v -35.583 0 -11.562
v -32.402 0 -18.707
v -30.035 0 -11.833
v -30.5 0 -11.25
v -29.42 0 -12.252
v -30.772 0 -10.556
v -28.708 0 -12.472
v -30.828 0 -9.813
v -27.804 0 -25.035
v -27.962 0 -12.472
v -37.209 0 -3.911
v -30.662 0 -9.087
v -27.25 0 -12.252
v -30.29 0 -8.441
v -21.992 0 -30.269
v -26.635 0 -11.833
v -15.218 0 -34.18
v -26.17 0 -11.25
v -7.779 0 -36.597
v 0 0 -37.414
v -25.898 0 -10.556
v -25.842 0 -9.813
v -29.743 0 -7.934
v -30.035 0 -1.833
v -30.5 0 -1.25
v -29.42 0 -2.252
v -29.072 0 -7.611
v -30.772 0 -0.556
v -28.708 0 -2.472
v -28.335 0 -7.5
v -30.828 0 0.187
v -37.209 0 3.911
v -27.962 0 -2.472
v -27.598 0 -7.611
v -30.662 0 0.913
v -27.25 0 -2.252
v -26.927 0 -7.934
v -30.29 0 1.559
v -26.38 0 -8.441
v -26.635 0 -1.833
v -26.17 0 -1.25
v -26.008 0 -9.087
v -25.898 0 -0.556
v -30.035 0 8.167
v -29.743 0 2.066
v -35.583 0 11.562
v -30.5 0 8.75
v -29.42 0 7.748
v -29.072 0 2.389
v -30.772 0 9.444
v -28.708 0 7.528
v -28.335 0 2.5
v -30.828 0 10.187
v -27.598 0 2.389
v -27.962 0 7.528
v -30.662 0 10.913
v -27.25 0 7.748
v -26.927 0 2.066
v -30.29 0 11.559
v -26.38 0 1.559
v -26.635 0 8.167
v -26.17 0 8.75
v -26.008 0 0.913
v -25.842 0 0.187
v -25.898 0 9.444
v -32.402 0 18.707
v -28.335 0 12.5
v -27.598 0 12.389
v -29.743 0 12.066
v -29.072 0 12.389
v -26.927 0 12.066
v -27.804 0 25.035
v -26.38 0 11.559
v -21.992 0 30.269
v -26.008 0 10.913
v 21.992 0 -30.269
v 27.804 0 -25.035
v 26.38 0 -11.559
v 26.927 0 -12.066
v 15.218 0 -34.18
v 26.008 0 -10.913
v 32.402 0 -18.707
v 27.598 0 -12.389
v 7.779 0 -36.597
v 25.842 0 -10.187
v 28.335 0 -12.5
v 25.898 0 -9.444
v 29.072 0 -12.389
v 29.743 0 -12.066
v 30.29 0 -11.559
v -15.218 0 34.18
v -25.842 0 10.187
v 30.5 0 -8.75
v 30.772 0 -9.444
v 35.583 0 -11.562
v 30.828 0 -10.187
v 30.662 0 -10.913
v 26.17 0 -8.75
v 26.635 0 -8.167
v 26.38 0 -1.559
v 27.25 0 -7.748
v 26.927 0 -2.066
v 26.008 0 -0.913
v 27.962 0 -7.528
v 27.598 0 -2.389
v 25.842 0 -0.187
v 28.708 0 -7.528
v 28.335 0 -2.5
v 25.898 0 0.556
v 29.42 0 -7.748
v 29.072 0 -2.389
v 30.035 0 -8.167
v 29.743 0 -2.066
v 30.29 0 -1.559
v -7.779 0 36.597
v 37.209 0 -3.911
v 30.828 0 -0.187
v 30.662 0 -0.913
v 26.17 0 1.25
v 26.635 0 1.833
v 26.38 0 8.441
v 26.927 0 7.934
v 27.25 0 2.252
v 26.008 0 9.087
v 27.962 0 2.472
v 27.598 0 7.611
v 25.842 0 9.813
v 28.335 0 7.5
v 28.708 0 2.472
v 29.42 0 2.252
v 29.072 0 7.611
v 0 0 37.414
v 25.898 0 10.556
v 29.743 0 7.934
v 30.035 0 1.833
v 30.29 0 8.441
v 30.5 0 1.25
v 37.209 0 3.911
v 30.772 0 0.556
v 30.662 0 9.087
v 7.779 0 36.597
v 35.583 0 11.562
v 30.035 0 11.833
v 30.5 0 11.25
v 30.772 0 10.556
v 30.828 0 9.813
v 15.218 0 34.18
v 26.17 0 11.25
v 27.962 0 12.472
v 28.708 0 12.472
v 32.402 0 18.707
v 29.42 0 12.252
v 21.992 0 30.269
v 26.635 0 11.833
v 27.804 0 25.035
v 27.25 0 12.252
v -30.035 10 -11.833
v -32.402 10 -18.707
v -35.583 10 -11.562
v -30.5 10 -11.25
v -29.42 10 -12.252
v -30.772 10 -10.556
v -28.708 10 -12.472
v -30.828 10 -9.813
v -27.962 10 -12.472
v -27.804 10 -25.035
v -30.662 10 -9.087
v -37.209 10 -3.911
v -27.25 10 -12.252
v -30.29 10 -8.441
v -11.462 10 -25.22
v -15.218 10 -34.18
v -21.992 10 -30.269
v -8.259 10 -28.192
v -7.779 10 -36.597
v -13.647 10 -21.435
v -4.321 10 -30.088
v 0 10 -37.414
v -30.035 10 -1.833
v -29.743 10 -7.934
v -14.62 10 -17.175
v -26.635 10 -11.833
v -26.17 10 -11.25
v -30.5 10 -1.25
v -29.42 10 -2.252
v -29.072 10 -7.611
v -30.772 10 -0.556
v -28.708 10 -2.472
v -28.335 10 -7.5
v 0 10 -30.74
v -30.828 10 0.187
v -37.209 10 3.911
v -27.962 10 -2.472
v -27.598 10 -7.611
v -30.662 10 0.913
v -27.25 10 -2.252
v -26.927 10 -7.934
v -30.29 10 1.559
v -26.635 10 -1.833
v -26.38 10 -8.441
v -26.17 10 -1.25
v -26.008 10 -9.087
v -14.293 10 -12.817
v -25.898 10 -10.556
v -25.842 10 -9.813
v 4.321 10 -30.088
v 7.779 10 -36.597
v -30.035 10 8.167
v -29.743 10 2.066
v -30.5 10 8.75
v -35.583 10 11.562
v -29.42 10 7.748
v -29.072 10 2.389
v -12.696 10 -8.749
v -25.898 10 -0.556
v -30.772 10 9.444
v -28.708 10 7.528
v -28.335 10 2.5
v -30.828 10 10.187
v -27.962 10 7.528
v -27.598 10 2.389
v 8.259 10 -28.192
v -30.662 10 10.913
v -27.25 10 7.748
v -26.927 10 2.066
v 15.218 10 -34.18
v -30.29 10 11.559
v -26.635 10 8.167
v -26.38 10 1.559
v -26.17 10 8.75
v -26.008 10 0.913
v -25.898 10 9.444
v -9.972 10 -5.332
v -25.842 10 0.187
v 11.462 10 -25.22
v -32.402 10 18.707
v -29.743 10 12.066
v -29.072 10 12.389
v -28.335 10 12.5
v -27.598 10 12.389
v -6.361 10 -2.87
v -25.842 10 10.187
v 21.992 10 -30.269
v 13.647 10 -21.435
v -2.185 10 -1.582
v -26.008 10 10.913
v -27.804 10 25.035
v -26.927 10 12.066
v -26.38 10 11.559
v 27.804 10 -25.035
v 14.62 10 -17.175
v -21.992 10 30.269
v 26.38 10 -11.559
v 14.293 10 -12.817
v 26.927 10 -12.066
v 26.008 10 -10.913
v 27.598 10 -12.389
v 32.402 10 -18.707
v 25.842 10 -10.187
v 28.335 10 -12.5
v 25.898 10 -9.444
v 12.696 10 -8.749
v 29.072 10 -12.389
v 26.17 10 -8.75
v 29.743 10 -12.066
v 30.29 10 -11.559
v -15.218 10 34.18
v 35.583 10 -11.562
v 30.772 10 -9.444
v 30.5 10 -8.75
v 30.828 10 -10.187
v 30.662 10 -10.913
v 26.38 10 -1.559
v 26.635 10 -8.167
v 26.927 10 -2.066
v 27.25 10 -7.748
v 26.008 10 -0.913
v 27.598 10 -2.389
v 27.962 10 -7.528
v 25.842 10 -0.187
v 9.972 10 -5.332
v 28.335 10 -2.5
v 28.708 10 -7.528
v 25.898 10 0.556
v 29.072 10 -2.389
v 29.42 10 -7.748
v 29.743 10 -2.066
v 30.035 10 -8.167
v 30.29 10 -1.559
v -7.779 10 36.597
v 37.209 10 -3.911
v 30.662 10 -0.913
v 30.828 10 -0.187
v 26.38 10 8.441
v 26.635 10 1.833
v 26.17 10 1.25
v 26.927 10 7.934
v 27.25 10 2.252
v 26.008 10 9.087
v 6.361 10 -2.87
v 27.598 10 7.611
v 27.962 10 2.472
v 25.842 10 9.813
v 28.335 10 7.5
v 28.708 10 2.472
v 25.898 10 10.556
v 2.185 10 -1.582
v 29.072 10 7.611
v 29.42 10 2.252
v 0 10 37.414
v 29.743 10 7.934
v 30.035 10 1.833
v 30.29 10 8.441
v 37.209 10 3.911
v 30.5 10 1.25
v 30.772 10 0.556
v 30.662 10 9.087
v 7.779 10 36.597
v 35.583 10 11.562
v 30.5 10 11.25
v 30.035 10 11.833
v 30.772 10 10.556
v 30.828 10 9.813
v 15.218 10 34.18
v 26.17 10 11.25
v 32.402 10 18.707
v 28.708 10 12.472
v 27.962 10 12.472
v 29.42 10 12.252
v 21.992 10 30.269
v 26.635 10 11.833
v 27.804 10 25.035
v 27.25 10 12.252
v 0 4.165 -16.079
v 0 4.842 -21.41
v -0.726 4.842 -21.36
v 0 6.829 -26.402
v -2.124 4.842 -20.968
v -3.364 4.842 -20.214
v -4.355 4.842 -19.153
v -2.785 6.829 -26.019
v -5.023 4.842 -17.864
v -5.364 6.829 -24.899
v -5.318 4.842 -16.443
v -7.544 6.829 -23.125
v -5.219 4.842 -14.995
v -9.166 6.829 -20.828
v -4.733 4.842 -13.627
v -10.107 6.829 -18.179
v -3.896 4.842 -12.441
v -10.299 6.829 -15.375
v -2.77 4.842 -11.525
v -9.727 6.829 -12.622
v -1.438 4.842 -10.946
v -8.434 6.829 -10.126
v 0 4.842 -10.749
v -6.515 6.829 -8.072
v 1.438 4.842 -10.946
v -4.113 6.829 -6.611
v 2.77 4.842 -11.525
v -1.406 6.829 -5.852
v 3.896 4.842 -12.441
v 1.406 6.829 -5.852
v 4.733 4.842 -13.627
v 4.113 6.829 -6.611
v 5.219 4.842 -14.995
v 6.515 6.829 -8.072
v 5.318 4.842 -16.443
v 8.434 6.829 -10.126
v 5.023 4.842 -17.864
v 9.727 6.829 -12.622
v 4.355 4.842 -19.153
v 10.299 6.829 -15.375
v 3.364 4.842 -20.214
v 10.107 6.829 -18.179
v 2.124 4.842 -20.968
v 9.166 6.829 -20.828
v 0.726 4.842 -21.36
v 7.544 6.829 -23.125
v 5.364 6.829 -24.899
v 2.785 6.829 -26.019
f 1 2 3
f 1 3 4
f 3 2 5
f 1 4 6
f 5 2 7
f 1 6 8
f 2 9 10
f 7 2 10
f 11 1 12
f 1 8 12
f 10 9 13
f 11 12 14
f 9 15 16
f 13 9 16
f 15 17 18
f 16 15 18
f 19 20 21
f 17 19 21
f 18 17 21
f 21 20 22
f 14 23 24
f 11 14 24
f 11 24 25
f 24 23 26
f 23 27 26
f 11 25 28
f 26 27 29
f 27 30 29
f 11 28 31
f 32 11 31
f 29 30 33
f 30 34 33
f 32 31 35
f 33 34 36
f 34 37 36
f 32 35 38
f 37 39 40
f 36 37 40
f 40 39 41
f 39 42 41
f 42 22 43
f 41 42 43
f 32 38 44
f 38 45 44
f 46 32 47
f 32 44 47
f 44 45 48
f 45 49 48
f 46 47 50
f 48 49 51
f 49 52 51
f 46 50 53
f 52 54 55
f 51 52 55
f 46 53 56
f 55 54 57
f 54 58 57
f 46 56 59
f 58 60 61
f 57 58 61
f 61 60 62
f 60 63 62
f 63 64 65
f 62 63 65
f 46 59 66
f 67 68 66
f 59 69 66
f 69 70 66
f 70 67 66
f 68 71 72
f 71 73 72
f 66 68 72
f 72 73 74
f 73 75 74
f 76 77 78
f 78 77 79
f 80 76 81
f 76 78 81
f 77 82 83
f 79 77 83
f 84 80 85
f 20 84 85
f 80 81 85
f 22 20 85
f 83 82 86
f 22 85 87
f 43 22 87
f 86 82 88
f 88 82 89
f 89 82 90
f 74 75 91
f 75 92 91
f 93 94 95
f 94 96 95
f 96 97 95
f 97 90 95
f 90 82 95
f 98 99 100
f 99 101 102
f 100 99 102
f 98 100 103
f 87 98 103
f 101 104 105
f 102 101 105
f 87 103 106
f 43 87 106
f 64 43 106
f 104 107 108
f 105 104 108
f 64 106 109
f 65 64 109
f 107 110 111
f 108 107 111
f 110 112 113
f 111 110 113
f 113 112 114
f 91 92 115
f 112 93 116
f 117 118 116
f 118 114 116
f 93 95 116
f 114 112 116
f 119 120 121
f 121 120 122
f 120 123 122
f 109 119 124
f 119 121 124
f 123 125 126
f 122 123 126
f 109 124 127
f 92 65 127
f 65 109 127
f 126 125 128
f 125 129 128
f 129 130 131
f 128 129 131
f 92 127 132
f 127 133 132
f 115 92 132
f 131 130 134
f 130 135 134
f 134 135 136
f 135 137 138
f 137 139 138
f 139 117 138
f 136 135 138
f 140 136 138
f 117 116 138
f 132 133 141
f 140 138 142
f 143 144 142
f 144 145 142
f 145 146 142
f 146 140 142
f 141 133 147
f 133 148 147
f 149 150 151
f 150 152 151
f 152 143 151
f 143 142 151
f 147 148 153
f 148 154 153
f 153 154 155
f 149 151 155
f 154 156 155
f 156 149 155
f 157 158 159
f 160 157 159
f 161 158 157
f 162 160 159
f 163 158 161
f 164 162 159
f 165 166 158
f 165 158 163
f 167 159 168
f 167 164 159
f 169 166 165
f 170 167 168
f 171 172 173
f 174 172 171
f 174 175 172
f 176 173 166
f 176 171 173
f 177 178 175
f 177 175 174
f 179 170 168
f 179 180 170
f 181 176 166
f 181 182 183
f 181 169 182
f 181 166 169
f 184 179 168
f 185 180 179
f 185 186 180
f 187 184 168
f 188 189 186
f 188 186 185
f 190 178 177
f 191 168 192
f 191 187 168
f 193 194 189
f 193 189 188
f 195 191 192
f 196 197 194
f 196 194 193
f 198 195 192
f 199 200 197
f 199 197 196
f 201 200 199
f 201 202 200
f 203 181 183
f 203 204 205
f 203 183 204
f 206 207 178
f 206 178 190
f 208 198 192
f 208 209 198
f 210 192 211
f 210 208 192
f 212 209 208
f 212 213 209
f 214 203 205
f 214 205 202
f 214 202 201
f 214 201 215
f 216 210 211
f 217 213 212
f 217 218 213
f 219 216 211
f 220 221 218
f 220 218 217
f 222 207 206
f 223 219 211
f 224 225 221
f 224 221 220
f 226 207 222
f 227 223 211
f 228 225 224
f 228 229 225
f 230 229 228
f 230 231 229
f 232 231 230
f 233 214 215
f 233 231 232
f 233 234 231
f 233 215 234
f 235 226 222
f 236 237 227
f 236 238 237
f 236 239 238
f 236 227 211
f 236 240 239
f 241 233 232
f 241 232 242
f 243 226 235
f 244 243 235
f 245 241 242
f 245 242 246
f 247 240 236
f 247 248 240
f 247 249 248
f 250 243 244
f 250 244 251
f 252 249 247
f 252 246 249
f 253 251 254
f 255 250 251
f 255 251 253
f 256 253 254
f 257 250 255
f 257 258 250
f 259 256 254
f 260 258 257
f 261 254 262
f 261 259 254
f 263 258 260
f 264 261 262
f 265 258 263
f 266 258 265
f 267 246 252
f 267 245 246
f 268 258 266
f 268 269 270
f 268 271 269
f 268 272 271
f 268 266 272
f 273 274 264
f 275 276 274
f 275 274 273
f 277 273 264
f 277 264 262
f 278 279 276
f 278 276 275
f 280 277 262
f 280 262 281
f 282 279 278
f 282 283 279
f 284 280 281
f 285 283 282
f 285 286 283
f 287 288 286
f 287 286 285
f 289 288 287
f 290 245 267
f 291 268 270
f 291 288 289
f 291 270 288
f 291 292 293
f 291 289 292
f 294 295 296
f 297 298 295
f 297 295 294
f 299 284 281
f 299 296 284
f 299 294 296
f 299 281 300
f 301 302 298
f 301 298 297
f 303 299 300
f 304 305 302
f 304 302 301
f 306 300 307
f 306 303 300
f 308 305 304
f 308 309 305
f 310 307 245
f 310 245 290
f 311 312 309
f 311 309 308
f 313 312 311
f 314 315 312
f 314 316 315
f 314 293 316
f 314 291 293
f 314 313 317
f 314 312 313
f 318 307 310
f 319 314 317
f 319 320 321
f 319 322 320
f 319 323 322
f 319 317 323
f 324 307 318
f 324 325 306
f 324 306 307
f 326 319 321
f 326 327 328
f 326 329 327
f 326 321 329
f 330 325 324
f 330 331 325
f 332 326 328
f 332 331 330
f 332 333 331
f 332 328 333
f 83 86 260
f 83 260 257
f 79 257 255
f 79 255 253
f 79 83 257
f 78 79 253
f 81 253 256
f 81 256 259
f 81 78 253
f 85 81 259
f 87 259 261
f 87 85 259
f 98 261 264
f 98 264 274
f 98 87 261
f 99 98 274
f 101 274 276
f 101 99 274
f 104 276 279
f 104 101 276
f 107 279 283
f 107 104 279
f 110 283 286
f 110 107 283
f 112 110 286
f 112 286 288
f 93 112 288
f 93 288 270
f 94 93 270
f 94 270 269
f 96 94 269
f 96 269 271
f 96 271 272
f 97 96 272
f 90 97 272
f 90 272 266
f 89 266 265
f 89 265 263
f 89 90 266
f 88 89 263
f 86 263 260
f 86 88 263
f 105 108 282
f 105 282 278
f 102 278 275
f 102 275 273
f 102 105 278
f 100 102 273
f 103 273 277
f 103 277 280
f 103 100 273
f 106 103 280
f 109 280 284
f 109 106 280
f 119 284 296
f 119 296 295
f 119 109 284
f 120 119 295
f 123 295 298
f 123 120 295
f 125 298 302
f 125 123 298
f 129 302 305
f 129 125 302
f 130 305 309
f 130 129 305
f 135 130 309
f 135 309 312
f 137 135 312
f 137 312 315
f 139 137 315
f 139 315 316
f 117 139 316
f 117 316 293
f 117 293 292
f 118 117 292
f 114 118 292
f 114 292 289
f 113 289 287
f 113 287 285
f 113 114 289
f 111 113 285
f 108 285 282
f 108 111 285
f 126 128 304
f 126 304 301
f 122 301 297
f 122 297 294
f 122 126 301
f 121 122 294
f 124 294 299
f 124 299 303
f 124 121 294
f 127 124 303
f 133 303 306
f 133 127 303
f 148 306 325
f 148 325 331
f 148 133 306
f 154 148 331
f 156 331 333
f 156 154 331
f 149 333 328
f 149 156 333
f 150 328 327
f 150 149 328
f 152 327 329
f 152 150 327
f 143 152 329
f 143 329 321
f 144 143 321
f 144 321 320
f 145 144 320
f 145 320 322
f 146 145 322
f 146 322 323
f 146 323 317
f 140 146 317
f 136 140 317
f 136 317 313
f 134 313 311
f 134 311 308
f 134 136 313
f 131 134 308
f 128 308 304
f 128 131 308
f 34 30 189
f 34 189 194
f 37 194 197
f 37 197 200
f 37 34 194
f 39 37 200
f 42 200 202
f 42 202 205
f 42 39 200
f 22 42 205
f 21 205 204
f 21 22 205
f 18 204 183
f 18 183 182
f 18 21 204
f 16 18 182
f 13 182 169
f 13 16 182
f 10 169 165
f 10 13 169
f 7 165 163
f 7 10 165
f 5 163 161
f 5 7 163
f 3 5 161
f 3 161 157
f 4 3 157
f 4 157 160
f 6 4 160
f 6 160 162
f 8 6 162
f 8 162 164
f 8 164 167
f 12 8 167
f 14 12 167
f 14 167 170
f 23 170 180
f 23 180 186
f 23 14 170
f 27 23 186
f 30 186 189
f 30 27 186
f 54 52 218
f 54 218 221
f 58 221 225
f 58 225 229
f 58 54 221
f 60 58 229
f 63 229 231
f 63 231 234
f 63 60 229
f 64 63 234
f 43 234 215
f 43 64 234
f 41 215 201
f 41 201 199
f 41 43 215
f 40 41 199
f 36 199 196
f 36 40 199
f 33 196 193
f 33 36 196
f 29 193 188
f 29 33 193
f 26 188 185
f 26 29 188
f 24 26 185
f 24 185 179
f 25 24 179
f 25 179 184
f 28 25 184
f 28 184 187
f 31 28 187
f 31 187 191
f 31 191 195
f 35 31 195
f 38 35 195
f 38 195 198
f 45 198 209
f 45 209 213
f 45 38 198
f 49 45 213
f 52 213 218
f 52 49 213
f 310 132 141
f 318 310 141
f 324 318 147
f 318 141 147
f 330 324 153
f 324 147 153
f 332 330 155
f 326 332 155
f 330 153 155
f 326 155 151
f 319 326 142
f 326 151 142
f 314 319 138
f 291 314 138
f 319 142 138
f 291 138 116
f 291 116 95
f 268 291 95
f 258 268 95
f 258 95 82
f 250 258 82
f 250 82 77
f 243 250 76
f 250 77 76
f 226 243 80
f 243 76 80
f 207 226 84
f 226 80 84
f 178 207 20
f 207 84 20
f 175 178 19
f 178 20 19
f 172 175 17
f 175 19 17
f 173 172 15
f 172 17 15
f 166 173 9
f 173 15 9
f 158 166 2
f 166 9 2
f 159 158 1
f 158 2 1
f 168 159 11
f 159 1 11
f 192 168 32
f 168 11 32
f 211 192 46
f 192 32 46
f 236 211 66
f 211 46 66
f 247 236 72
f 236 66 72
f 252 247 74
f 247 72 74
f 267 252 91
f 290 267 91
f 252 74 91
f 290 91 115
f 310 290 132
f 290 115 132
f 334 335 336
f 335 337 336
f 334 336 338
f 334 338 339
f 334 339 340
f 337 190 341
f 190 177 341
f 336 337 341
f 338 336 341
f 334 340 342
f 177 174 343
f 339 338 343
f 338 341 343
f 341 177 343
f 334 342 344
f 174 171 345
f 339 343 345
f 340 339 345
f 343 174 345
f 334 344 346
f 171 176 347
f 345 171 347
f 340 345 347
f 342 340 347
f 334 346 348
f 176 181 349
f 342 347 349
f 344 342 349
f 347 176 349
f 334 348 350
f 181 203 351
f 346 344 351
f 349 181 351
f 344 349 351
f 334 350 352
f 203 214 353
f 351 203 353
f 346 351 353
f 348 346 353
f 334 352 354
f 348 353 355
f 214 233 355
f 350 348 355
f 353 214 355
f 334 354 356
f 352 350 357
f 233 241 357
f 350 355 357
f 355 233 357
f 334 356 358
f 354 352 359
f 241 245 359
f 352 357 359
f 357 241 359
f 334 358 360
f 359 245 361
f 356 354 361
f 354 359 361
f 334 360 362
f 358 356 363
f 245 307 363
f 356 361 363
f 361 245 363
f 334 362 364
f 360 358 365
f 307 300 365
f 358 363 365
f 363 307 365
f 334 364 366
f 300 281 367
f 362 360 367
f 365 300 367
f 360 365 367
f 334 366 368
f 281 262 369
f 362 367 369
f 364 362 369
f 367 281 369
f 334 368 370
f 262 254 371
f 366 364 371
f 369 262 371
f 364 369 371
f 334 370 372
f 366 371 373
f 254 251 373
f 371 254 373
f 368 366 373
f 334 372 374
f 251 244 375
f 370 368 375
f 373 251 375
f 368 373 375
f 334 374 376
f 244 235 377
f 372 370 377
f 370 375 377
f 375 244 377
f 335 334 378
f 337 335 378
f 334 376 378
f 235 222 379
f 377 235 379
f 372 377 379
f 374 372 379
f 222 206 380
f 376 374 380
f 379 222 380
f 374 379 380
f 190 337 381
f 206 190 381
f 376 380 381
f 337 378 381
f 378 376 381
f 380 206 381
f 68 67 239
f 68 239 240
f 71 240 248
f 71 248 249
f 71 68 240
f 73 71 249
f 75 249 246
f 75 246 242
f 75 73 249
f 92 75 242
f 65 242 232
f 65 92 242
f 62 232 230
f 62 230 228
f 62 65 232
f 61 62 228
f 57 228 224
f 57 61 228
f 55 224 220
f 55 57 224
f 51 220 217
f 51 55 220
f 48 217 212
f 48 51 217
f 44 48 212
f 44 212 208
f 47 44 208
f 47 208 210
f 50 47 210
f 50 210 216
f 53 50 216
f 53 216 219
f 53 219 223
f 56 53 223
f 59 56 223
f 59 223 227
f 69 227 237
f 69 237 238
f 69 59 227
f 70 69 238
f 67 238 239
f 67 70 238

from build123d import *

# Parameters (mm, degrees)
SKETCH1_R           = 37.4142
SKETCH1_R_2         = 2.5
BOSS_EXTRUDE1_DEPTH = 10


with BuildPart() as part:
    # Sketch1 → Boss-Extrude1 (new body)
    with BuildSketch(Plane(origin=(0, 0, 0), x_dir=(1, 0, 0), z_dir=(0, 1, 0))):
        with Locations(Location((0, 0, 0), (0, 0, 270))):
            Circle(SKETCH1_R)
        with Locations(Location((-28.335, 0, 0), (0, 0, 270))):
            Circle(SKETCH1_R_2, mode=Mode.SUBTRACT)
        with Locations(Location((28.335, 0, 0), (0, 0, 90))):
            Circle(SKETCH1_R_2, mode=Mode.SUBTRACT)
        with Locations(Location((-28.335, 10, 0), (0, 0, 270))):
            Circle(SKETCH1_R_2, mode=Mode.SUBTRACT)
        with Locations(Location((-28.335, -10, 0), (0, 0, 270))):
            Circle(SKETCH1_R_2, mode=Mode.SUBTRACT)
        with Locations(Location((28.335, -10, 0), (0, 0, 90))):
            Circle(SKETCH1_R_2, mode=Mode.SUBTRACT)
        with Locations(Location((28.335, 10, 0), (0, 0, 90))):
            Circle(SKETCH1_R_2, mode=Mode.SUBTRACT)
    extrude(amount=BOSS_EXTRUDE1_DEPTH)

    # Sketch2 → Cut-Revolve12 (revolve, cut)
    with BuildSketch(Plane(origin=(0, 0, 0), x_dir=(0, 0, -1), z_dir=(1, 0, 0))):
        with BuildLine():
            Line((16.0792, 46.835), (16.0792, 4.165))
            ThreePointArc((16.0792, 4.165), (37.4142, 25.5), (16.0792, 46.835))
        make_face()
    revolve(axis=Axis((0, 52.533559147, -16.0792), (0, 1, 0)), mode=Mode.SUBTRACT)


solid = part.part
